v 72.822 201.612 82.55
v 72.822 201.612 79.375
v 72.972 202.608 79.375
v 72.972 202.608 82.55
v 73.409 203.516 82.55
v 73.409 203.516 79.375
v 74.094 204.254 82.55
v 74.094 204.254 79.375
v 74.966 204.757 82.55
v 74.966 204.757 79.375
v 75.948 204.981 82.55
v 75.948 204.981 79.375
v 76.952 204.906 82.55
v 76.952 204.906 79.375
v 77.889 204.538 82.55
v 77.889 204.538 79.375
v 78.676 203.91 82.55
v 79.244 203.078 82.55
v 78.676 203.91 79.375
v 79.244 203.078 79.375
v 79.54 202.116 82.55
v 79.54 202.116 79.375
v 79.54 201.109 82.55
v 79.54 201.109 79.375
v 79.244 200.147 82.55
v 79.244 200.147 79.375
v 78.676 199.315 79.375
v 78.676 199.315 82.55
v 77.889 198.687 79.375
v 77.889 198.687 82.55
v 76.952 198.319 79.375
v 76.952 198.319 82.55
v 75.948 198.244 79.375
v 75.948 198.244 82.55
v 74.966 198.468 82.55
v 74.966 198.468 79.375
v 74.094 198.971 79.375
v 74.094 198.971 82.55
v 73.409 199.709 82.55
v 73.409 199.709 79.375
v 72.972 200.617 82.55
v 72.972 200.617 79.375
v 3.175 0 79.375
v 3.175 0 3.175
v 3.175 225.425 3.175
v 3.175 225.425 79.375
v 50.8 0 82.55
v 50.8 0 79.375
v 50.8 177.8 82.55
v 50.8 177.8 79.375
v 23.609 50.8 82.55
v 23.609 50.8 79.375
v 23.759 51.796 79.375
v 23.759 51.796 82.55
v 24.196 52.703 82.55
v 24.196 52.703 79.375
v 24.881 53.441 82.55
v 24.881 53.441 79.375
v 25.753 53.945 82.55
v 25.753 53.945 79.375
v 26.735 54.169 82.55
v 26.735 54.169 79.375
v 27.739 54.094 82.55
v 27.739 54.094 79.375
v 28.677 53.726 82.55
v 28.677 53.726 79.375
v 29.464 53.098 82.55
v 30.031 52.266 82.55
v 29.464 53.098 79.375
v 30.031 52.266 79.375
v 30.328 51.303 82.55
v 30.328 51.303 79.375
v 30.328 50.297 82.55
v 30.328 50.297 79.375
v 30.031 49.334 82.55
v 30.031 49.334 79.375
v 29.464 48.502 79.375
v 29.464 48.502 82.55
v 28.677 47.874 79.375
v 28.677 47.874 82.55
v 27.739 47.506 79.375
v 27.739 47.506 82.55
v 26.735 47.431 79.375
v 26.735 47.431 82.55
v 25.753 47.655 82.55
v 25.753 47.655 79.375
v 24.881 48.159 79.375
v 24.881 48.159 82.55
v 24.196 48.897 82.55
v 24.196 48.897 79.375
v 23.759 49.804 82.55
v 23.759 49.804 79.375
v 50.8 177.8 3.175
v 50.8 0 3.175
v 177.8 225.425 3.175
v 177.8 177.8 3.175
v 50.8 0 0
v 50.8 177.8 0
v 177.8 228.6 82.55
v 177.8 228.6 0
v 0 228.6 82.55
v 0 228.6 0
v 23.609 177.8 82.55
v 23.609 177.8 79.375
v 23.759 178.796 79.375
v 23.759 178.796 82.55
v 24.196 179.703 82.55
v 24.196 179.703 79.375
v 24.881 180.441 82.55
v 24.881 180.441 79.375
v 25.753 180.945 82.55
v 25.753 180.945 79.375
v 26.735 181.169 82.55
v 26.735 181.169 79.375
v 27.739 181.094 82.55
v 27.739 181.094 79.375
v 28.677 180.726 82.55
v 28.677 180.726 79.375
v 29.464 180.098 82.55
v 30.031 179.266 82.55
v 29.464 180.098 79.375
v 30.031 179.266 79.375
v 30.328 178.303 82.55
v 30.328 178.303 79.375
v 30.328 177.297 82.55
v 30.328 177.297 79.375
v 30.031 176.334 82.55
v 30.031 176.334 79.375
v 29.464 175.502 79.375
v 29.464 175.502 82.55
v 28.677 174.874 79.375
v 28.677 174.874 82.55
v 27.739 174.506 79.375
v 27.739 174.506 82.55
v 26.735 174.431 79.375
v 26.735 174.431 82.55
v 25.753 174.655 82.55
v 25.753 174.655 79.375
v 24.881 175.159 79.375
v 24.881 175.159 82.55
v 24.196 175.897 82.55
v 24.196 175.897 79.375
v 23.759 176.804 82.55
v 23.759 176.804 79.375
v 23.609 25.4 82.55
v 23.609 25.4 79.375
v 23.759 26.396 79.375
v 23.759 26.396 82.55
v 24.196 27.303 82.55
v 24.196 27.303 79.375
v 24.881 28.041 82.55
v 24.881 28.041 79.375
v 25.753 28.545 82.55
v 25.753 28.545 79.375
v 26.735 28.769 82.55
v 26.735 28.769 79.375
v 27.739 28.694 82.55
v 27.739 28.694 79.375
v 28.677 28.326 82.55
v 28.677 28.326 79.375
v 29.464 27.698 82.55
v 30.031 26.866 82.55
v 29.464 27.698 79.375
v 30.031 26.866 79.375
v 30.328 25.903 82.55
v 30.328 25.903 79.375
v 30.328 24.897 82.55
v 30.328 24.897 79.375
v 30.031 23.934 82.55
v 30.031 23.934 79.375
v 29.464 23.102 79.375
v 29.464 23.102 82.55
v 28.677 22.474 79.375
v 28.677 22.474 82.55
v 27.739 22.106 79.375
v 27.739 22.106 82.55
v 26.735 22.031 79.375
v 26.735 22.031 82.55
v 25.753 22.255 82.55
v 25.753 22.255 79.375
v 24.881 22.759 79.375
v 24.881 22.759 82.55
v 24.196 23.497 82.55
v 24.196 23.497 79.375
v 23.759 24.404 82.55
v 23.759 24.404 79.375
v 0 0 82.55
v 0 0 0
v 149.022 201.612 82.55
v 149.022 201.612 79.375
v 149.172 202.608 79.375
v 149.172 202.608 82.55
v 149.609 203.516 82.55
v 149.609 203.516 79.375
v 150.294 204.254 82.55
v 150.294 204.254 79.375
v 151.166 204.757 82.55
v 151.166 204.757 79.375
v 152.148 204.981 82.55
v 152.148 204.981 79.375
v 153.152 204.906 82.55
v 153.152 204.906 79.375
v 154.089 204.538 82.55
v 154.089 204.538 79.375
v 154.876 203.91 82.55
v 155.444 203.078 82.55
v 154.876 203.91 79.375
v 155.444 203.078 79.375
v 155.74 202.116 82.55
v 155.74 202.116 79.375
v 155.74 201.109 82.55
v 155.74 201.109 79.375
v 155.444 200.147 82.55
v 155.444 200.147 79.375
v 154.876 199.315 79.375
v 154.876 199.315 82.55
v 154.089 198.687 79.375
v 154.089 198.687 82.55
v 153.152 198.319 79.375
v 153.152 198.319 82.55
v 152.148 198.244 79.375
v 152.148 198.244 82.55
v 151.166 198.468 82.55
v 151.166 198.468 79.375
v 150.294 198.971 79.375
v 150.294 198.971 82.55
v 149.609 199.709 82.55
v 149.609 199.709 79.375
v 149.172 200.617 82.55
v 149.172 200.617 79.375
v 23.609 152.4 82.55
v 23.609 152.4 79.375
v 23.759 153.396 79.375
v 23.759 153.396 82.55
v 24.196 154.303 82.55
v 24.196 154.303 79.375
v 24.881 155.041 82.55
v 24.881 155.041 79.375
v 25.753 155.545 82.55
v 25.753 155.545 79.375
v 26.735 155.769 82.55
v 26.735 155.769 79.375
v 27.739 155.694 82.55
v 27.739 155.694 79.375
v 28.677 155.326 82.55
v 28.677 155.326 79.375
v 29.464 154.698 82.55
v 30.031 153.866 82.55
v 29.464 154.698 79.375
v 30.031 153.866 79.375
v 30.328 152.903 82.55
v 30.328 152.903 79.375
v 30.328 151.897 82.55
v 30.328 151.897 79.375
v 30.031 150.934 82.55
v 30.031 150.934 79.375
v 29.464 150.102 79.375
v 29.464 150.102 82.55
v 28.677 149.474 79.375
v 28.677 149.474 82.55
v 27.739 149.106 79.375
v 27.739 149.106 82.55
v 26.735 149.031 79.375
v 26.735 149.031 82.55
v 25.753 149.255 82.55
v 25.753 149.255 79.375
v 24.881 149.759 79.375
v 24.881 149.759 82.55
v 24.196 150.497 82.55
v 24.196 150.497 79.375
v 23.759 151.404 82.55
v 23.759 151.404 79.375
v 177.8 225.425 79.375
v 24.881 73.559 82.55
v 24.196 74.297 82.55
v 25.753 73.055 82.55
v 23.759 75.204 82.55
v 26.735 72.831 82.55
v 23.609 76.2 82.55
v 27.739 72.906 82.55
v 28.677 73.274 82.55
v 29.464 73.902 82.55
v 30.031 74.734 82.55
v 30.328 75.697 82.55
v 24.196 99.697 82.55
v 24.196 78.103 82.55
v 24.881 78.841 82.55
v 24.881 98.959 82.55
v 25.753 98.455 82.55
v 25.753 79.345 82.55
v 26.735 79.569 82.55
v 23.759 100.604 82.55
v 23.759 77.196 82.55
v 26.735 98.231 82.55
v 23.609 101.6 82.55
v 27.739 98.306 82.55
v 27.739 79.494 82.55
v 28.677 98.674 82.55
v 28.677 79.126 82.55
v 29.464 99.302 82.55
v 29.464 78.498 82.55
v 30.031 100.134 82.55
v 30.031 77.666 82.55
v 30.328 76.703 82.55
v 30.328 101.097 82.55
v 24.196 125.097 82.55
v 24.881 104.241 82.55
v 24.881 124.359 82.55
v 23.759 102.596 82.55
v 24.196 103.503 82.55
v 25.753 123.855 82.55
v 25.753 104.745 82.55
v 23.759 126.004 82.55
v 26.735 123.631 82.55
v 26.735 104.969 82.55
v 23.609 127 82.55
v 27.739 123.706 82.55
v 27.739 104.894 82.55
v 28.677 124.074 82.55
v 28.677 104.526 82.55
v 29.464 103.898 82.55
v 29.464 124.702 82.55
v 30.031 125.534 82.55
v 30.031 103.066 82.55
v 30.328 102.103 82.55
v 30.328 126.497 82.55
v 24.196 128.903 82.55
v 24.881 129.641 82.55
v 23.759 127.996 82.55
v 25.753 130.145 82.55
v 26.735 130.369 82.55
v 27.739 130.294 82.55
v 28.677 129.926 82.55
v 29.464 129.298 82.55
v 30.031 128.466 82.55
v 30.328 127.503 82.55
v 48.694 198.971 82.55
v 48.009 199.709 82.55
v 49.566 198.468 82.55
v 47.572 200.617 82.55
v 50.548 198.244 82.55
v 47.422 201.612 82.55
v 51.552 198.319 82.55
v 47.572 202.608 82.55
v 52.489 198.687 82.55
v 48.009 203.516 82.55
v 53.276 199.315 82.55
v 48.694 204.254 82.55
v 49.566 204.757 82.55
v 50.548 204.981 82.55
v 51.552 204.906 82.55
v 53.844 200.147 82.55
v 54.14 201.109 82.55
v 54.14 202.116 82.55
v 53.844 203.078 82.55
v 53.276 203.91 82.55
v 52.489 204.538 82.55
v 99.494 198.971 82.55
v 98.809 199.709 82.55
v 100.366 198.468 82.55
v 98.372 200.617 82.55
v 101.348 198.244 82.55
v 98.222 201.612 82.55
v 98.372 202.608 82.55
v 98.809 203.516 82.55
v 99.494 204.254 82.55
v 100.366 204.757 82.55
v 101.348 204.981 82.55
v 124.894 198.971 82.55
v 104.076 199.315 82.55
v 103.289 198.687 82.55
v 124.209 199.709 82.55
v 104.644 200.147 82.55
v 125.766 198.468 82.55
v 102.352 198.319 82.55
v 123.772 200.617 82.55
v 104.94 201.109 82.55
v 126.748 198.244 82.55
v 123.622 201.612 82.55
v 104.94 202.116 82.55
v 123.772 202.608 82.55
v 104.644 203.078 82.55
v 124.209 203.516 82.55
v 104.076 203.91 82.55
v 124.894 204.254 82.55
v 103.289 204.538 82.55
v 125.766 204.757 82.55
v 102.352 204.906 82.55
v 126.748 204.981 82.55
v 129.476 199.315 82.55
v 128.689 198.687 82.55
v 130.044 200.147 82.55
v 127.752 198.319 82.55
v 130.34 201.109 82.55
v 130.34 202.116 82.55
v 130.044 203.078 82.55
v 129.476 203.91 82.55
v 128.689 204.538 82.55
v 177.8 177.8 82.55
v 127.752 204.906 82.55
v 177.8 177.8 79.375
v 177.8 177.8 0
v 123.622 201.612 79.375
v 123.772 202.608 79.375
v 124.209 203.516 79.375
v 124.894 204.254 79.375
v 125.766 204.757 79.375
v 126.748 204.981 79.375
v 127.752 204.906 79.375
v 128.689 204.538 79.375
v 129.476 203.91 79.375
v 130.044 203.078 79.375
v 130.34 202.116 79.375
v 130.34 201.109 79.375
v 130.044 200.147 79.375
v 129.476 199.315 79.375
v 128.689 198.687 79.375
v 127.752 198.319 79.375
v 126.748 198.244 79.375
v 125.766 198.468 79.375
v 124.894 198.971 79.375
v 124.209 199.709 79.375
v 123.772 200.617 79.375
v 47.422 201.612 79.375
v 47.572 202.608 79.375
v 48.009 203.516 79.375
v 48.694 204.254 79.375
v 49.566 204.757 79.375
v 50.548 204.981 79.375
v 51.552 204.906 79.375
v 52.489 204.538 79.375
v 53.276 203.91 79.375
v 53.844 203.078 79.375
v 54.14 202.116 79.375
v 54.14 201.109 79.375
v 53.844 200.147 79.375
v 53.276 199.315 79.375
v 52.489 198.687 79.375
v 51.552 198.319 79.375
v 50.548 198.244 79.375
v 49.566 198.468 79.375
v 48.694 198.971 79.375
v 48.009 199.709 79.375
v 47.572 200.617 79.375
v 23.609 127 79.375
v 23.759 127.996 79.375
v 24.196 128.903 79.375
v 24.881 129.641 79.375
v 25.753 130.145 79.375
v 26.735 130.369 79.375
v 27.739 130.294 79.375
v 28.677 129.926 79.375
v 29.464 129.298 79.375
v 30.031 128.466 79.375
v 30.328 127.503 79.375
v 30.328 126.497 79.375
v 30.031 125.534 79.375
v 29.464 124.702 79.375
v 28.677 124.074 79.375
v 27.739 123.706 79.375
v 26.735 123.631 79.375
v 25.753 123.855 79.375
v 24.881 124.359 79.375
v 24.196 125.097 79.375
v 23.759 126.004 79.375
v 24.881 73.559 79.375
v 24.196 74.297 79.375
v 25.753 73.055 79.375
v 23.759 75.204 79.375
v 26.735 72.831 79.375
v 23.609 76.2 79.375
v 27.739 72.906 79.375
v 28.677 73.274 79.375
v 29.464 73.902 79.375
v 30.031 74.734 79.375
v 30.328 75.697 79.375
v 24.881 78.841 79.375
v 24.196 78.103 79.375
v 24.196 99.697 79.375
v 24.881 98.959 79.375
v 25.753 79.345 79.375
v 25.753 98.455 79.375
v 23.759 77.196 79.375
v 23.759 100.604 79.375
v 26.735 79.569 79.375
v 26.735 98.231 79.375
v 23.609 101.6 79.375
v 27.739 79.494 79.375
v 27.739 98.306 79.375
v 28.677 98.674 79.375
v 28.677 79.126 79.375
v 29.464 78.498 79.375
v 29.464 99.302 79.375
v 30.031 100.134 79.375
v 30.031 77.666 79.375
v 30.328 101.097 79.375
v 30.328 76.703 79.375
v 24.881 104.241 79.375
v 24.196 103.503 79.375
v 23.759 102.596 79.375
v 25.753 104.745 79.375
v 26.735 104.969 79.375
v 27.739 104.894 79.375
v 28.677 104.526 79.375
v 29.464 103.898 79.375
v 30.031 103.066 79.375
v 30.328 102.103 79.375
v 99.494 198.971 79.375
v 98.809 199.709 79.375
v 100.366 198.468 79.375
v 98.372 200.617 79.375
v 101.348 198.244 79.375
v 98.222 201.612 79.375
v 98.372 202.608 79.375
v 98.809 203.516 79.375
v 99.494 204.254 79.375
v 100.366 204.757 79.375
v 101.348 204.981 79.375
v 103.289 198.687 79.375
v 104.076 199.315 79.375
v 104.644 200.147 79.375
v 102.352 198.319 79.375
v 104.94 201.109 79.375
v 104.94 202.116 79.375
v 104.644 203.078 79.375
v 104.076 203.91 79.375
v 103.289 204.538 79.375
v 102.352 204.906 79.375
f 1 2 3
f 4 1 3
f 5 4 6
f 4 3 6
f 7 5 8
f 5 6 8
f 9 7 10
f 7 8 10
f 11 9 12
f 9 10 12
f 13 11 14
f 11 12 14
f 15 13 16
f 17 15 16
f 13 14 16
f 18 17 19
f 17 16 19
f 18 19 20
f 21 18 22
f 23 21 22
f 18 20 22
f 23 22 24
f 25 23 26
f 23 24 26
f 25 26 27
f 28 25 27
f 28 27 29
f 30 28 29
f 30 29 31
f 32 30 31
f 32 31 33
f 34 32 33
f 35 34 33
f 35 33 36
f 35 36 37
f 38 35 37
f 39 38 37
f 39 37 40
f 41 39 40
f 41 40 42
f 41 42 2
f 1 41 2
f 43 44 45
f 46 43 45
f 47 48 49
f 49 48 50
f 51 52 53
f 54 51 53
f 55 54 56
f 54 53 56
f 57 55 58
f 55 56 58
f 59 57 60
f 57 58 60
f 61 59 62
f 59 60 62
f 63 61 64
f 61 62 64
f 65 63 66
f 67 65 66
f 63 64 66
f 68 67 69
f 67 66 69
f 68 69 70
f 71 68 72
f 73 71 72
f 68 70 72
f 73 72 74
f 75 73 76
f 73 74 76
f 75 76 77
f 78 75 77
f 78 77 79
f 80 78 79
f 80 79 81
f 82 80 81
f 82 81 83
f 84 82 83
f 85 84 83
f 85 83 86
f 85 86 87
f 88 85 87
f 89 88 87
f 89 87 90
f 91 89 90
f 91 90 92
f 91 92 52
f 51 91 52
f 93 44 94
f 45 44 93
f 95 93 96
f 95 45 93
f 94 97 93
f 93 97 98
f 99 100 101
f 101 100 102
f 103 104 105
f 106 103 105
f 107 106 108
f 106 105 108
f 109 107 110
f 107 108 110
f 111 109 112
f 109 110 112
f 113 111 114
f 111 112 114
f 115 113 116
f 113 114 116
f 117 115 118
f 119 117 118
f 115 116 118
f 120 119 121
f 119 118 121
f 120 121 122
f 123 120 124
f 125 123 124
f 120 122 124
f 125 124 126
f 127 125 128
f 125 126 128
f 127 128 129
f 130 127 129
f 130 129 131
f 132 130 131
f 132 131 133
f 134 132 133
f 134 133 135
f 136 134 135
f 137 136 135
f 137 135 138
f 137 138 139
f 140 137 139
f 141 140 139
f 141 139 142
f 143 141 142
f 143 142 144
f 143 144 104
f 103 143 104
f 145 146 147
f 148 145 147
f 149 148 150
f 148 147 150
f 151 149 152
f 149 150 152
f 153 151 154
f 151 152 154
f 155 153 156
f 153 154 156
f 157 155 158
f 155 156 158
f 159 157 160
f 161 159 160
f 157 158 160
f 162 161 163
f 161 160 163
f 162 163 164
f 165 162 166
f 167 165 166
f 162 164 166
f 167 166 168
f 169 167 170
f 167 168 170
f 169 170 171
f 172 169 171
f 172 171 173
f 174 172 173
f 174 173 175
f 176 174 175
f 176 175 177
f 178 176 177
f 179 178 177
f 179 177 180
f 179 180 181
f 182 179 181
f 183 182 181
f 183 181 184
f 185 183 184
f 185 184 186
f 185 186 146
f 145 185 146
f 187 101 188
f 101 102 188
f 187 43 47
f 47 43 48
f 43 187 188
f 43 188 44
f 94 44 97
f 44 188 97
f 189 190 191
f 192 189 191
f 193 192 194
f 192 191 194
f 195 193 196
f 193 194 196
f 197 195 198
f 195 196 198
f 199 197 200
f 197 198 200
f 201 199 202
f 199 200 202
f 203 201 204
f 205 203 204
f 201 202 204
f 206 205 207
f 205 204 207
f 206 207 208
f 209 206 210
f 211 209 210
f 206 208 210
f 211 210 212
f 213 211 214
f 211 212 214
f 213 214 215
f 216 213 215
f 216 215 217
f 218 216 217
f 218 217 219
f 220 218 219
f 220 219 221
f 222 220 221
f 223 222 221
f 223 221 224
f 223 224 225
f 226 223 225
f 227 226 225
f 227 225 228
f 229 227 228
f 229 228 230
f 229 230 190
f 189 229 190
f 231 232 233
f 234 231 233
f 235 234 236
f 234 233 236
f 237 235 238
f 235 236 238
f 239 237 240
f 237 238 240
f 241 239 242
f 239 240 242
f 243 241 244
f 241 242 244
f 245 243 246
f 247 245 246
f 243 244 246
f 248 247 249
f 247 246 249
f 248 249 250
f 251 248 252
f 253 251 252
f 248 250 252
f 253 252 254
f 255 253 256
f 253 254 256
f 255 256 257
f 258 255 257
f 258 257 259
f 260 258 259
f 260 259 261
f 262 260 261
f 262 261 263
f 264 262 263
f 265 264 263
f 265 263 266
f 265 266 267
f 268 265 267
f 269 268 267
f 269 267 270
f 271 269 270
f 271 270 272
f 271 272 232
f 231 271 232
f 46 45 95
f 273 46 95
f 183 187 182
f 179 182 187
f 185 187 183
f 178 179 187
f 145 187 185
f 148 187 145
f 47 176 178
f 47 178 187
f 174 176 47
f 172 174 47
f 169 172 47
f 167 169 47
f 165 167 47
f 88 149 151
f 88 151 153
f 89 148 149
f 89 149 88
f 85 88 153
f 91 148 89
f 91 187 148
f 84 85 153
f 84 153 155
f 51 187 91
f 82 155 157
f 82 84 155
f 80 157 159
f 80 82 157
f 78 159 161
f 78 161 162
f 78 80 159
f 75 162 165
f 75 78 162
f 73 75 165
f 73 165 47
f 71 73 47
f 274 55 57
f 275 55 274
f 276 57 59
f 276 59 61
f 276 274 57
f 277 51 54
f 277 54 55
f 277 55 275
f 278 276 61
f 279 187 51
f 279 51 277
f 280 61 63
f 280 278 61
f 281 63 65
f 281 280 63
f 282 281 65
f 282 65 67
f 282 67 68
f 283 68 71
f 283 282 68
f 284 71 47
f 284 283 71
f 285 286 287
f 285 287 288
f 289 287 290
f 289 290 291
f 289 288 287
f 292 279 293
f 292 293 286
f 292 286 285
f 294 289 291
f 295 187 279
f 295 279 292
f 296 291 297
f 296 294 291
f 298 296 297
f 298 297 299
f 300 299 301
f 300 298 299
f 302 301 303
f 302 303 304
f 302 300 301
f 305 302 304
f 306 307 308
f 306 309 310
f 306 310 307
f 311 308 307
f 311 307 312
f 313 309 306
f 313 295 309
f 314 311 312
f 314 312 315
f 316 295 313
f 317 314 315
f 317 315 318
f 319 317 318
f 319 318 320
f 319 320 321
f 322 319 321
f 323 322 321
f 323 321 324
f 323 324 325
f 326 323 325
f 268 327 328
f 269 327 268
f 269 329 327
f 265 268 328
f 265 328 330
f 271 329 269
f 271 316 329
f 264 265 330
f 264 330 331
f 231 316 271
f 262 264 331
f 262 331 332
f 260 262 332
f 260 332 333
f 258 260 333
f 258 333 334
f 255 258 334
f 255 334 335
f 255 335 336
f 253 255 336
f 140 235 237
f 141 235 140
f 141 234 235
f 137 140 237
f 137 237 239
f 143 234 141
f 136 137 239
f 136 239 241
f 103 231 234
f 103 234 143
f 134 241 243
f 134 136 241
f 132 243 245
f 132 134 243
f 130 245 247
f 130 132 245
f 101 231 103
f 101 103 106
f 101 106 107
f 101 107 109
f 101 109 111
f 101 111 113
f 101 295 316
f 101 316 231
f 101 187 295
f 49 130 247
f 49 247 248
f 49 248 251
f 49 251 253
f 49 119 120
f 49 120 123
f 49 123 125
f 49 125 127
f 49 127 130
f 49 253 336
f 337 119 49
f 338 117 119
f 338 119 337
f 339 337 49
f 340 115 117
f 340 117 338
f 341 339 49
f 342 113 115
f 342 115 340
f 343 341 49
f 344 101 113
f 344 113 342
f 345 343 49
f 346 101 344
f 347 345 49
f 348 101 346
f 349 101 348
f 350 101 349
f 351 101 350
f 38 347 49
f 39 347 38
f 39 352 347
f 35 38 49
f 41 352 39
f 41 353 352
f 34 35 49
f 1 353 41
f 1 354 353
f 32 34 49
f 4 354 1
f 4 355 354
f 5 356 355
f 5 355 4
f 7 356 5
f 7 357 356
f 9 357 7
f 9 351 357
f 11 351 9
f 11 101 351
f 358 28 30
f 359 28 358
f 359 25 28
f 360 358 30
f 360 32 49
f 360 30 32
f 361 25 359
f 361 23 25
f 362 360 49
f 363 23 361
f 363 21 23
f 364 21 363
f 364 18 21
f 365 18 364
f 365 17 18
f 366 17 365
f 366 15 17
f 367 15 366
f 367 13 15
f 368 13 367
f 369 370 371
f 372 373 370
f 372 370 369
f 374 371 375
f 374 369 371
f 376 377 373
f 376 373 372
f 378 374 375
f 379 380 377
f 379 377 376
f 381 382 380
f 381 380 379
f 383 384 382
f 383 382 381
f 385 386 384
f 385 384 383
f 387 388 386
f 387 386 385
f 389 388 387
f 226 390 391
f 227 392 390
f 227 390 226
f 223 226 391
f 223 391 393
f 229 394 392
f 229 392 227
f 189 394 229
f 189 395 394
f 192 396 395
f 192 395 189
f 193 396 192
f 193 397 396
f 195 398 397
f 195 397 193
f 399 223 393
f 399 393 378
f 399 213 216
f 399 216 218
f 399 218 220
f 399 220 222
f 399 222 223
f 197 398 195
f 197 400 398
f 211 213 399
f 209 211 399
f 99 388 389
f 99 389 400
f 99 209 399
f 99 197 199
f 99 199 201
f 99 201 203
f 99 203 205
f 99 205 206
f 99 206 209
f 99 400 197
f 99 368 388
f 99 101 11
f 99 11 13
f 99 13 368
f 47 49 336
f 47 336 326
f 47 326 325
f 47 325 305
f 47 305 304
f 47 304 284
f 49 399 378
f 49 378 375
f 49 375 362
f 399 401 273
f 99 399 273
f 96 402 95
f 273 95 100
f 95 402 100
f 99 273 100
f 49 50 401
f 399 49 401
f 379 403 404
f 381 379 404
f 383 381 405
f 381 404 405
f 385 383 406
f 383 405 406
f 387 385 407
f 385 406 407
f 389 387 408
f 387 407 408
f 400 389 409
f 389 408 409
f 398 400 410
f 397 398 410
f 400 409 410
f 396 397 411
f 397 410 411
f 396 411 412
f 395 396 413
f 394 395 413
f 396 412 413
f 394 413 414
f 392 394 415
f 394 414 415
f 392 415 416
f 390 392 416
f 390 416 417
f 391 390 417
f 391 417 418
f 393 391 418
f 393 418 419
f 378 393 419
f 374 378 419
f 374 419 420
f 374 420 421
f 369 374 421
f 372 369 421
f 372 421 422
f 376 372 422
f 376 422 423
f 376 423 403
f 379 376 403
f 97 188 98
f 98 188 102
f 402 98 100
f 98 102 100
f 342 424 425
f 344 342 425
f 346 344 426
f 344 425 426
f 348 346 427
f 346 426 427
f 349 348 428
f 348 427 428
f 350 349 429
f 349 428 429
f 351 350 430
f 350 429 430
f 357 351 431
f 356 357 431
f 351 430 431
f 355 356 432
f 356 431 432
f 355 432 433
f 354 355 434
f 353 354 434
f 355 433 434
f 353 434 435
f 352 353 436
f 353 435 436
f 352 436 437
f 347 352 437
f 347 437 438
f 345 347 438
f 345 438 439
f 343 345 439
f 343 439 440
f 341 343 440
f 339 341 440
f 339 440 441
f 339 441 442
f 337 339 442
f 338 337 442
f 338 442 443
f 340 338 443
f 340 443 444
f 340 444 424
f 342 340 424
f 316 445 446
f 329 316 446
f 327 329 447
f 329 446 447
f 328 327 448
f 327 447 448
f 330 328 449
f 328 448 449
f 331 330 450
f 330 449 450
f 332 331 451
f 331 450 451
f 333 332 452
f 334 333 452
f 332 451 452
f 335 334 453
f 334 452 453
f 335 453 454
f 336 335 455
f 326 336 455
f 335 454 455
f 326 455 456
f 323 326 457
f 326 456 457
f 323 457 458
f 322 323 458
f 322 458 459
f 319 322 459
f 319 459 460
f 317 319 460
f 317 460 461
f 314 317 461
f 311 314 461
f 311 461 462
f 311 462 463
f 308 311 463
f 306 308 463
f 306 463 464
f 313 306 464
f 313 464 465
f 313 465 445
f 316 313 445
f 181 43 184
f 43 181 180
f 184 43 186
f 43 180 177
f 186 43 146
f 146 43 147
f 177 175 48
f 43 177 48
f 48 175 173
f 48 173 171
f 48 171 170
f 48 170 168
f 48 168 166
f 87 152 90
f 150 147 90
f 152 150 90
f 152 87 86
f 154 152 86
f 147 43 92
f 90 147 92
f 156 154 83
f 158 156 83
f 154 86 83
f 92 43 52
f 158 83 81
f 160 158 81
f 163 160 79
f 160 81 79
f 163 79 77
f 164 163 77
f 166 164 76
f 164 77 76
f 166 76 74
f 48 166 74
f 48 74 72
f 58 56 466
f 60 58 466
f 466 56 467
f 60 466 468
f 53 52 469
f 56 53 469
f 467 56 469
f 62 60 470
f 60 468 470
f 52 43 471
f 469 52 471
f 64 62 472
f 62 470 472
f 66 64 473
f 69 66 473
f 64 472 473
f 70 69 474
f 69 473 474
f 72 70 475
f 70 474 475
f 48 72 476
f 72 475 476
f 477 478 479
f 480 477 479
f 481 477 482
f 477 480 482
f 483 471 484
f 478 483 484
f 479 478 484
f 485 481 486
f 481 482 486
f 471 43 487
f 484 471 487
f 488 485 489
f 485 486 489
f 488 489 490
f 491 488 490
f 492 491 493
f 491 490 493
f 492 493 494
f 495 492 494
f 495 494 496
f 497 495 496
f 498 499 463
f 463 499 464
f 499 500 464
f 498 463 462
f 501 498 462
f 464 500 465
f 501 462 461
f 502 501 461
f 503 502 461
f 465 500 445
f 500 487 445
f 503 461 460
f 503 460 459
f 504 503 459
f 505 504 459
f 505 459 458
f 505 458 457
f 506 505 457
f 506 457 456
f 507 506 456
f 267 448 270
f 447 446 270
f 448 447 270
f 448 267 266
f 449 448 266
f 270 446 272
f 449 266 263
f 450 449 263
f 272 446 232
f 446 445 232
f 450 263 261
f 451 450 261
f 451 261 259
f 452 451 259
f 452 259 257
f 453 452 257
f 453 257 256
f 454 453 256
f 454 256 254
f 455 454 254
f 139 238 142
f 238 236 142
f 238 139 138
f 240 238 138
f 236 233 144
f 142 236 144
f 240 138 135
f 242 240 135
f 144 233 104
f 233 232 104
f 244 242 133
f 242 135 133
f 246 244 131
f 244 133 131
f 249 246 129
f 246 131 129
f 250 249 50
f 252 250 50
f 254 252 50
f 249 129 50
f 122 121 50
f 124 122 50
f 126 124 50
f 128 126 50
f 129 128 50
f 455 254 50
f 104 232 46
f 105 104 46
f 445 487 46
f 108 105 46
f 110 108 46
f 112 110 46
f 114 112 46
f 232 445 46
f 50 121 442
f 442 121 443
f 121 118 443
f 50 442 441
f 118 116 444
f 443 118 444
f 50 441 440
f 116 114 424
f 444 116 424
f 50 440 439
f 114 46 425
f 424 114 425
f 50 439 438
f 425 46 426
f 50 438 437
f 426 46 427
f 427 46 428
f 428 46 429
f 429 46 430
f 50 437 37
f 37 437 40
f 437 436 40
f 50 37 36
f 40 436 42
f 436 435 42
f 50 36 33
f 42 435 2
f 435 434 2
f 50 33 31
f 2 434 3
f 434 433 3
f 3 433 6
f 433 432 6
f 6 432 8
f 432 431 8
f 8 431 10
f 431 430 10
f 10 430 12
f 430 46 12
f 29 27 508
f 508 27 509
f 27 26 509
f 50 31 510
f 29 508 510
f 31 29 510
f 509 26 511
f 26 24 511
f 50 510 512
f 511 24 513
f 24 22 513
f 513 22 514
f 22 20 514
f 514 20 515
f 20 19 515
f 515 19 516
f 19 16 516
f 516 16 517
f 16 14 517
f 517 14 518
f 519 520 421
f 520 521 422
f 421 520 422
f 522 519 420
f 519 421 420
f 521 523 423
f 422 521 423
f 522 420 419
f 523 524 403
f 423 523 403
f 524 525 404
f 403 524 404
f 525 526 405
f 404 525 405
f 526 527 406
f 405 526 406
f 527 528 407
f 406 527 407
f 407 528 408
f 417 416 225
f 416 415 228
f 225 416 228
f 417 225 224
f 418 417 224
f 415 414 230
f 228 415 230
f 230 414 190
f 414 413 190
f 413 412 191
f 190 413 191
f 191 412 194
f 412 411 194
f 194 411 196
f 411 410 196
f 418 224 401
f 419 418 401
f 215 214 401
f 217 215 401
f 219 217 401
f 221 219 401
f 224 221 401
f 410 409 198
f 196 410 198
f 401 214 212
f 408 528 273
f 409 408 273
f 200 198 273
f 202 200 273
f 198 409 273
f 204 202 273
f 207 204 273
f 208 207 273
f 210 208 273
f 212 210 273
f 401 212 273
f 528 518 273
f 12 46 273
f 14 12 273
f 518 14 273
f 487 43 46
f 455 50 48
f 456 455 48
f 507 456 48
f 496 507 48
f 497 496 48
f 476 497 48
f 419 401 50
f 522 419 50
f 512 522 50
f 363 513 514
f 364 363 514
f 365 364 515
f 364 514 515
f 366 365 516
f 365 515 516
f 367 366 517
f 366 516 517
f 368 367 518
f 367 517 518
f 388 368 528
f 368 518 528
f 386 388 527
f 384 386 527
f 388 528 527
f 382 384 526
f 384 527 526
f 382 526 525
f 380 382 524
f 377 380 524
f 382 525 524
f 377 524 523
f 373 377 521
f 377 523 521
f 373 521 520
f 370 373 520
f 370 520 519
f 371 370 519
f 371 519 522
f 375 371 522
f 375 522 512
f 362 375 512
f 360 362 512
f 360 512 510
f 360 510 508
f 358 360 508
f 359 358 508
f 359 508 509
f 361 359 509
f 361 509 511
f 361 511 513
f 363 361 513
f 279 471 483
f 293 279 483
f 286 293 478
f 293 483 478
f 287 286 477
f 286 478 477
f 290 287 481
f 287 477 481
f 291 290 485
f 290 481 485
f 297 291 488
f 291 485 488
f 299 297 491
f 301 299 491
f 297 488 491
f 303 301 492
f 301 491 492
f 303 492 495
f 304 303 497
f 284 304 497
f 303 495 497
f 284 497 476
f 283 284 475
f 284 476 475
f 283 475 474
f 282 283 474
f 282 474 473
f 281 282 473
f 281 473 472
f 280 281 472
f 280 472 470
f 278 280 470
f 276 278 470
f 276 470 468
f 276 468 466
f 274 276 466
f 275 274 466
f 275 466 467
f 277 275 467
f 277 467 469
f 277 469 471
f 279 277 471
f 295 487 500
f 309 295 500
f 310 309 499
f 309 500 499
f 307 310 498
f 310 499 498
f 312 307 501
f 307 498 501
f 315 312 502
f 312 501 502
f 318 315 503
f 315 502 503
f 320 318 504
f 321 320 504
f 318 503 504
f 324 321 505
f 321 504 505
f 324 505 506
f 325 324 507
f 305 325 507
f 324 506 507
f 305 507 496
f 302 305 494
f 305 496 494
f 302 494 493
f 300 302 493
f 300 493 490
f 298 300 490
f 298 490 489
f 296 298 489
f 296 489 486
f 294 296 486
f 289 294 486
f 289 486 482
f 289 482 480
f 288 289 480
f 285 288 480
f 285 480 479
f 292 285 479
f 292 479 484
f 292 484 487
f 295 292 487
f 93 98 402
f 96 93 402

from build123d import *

# Parameters (mm, degrees)
F0_W     = 50.8
F0_H     = 177.8
F1_DEPTH = 3.175
F3_DEPTH = 76.2
F5_DEPTH = 3.175
F7_D     = 6.7564
F7_DEPTH = 29.21
F7_TIP   = 2.0298273432


with BuildPart() as f1:
    # F0 (on Top) → F1 (new body)
    with BuildSketch(Plane.XY):
        Polygon((0, 228.6), (0, 177.8), (50.8, 177.8), (177.8, 177.8), (177.8, 228.6), align=None)
        with Locations((25.4, 88.9)):
            Rectangle(F0_W, F0_H)
    extrude(amount=F1_DEPTH)

    # F2 (on face) → F3 (join)
    with BuildSketch(Plane.XY.offset(3.175)):
        Polygon((3.175, 0), (3.175, 225.425), (177.8, 225.425), (177.8, 228.6), (0, 228.6), (0, 0), align=None)
    extrude(amount=F3_DEPTH)

    # F4 (on face) → F5 (join)
    with BuildSketch(Plane.XY.offset(79.375)):
        Polygon((177.8, 228.6), (0, 228.6), (0, 0), (3.175, 0), (3.175, 225.425), (177.8, 225.425), align=None)
        Polygon((177.8, 177.8), (177.8, 225.425), (3.175, 225.425), (3.175, 0), (50.8, 0), (50.8, 177.8), align=None)
    extrude(amount=F5_DEPTH)

    # F7
    with Locations(Plane.XY.offset(82.55)):
        with Locations((26.9875, 25.4), (26.9875, 50.8), (26.9875, 76.2), (26.9875, 101.6), (26.9875, 127), (26.9875, 152.4), (26.9875, 177.8), (50.8, 201.6125), (76.2, 201.6125), (101.6, 201.6125), (127, 201.6125), (152.4, 201.6125)):
            Hole(F7_D / 2, depth=F7_DEPTH)
            with Locations((0, 0, -(F7_DEPTH + F7_TIP / 2))):  # 118° drill point
                Cone(0, F7_D / 2, F7_TIP, mode=Mode.SUBTRACT)


solid = f1.part
